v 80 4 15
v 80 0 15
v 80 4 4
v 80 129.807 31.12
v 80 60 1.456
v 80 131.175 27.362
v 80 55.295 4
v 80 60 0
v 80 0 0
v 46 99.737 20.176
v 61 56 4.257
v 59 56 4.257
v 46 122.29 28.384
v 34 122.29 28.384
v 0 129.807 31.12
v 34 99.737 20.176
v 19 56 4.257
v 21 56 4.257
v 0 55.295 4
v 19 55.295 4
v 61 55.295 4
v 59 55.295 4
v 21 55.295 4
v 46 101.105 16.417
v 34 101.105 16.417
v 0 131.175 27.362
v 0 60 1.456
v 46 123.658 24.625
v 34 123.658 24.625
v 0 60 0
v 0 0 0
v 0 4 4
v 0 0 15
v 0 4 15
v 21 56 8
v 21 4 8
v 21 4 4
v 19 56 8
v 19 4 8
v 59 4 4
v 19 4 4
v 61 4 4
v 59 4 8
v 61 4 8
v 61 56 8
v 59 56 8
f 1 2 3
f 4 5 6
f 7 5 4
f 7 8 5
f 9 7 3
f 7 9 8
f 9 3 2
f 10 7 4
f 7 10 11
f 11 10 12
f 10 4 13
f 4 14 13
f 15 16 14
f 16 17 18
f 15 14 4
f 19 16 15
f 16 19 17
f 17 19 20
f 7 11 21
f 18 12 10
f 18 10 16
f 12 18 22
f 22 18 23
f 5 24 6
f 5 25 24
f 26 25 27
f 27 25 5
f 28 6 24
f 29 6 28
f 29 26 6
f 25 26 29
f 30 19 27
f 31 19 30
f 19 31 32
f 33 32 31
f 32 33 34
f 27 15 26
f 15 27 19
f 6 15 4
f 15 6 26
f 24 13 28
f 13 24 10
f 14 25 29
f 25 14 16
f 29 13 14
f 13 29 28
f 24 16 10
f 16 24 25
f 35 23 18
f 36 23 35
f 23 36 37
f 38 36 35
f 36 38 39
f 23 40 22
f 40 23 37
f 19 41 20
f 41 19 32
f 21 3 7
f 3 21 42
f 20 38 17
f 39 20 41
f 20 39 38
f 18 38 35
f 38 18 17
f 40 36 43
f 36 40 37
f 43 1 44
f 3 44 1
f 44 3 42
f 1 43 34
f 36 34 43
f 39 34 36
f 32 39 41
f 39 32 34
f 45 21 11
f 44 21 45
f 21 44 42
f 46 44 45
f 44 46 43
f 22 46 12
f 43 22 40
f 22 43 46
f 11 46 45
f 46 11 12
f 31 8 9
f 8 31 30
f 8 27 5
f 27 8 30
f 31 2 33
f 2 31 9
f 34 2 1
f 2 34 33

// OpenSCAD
// Vorea Studio — Parametric Phone/Tablet Stand
// Adjustable angle desk stand for phones and tablets
// Compatible: Vorea Studio SCAD Engine

// [Section: Dimensions]
stand_width = 80;   // [40:5:150] Ancho del soporte (mm)
stand_depth = 60;   // [40:5:100] Profundidad de base (mm)
stand_height = 80;  // [40:5:120] Altura del respaldo (mm)
thickness = 4;      // [2:1:8] Grosor del material

// [Section: Design]
angle = 70;         // [45:5:85] Angulo de inclinacion (grados)
lip_height = 15;    // [8:1:30] Altura del labio frontal
slot_width = 12;    // [8:1:20] Ancho de la ranura para cable
cable_hole = 1;     // [0:1:1] Agujero para cable (0=no, 1=si)

$fn = 32;

// Base plate
cube([stand_width, stand_depth, thickness]);

// Front lip
translate([0, 0, 0])
  cube([stand_width, thickness, lip_height]);

// Angled backrest
translate([0, stand_depth - thickness, 0])
  rotate([90 - angle, 0, 0])
    difference() {
      cube([stand_width, stand_height, thickness]);
      
      // Cable slot
      if (cable_hole == 1) {
        translate([stand_width/2 - slot_width/2, stand_height * 0.6, -1])
          cube([slot_width, stand_height * 0.3, thickness + 2]);
      }
    }

// Side supports
for (x = [0, stand_width - thickness]) {
  translate([x, thickness, 0])
    linear_extrude(height = thickness)
      polygon([
        [0, 0],
        [0, stand_depth - thickness*2],
        [0, 0]
      ]);
}

// Reinforcement ribs
for (x = [stand_width * 0.25, stand_width * 0.75]) {
  translate([x - thickness/4, thickness, thickness])
    cube([thickness/2, stand_depth - thickness * 2, thickness]);
}
